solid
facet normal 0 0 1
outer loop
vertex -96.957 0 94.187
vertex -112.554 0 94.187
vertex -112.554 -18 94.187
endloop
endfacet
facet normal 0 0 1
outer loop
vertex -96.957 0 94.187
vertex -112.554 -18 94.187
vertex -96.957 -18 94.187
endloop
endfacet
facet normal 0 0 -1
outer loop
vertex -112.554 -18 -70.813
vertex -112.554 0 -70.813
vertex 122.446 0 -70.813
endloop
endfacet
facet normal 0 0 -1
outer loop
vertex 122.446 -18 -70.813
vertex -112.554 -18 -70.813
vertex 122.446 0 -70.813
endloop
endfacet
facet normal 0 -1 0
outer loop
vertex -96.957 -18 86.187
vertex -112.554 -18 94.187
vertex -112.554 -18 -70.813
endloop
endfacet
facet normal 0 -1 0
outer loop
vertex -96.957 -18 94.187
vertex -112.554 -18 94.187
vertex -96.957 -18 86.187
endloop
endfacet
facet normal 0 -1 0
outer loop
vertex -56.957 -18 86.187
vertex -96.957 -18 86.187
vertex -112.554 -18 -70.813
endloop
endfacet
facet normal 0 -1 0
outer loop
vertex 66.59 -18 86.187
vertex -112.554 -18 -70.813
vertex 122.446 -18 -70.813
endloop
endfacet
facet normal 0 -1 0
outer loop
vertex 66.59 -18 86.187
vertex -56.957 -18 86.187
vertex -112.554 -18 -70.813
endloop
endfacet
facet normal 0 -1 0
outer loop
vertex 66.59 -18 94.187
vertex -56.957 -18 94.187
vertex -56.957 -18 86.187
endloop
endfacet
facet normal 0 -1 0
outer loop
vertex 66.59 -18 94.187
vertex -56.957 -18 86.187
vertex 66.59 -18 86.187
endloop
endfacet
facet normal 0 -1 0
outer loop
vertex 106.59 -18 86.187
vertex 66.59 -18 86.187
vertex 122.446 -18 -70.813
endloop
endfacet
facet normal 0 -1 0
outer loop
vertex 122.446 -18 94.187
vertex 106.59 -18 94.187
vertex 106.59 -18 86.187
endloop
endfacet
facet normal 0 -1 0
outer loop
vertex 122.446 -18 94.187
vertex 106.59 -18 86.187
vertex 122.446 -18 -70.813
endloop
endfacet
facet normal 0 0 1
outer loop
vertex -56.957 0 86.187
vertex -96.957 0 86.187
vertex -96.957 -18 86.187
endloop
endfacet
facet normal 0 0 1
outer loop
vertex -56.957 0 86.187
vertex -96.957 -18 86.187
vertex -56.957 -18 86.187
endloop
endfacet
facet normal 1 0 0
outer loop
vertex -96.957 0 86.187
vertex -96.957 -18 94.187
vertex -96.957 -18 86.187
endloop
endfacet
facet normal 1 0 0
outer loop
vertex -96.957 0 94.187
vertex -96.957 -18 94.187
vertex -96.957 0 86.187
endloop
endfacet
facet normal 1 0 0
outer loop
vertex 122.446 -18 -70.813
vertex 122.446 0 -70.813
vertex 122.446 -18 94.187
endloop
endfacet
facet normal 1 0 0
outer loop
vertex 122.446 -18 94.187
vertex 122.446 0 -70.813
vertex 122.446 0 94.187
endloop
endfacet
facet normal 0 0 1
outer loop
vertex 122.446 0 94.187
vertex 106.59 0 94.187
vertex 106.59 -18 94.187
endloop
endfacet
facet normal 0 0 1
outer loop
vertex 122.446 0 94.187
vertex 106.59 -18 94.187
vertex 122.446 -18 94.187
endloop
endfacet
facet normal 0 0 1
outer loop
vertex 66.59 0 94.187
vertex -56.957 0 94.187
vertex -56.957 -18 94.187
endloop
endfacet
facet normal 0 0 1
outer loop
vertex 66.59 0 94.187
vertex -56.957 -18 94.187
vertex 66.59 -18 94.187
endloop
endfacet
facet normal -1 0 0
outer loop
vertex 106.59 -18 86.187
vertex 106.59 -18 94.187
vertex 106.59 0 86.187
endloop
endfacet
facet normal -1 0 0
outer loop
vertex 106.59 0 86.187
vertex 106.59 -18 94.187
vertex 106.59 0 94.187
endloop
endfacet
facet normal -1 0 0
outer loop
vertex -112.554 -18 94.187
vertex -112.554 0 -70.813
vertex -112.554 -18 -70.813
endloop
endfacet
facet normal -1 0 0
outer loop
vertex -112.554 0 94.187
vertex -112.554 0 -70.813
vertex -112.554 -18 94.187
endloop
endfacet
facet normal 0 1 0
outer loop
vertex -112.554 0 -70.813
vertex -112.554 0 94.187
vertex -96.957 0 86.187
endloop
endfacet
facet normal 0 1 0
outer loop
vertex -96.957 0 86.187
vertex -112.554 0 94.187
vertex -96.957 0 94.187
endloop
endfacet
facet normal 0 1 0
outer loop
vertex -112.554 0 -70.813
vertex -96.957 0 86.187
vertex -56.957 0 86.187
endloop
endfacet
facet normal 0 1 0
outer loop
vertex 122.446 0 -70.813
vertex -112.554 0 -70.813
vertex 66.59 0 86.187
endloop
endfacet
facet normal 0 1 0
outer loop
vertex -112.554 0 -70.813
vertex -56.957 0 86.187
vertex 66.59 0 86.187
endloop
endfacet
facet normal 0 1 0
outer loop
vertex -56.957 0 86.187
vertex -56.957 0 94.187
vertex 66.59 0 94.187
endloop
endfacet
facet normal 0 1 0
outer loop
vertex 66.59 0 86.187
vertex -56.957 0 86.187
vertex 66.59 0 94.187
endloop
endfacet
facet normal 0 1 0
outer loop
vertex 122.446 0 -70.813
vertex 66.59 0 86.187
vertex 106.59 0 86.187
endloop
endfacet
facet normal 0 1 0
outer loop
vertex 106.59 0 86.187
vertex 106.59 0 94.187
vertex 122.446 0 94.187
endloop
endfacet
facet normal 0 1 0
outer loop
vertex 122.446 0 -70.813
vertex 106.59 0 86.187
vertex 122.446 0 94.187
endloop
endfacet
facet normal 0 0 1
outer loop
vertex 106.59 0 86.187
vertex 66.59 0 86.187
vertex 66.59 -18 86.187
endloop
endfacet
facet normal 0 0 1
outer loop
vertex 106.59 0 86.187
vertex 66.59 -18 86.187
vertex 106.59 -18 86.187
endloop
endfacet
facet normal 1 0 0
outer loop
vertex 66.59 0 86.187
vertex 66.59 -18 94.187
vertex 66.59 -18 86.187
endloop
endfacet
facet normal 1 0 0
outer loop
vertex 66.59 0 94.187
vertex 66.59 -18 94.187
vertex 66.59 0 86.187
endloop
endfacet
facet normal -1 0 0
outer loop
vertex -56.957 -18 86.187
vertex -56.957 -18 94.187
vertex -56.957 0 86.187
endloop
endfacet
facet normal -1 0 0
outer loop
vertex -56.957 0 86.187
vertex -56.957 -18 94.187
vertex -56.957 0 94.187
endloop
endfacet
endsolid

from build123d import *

# Parameters (mm, degrees)
F0_W     = 235
F0_H     = 165
F1_DEPTH = 18
F2_W     = 40
F2_H     = 18
F3_DEPTH = 8
F4_W     = 40
F4_H     = 18
F5_DEPTH = 8


with BuildPart() as f1:
    # F0 (on Front) → F1 (new body)
    with BuildSketch(Plane.XZ):
        with Locations((4.946282, 11.687499)):
            Rectangle(F0_W, F0_H)
    extrude(amount=F1_DEPTH)

    # F2 (on face) → F3 (cut)
    with BuildSketch(Plane.XY.offset(94.187499)):
        with Locations((86.589683, -9)):
            Rectangle(F2_W, F2_H)
    extrude(amount=-F3_DEPTH, mode=Mode.SUBTRACT)

    # F4 (on face) → F5 (cut)
    with BuildSketch(Plane.XY.offset(94.187499)):
        with Locations((-76.956588, -9)):
            Rectangle(F4_W, F4_H)
    extrude(amount=-F5_DEPTH, mode=Mode.SUBTRACT)


solid = f1.part
